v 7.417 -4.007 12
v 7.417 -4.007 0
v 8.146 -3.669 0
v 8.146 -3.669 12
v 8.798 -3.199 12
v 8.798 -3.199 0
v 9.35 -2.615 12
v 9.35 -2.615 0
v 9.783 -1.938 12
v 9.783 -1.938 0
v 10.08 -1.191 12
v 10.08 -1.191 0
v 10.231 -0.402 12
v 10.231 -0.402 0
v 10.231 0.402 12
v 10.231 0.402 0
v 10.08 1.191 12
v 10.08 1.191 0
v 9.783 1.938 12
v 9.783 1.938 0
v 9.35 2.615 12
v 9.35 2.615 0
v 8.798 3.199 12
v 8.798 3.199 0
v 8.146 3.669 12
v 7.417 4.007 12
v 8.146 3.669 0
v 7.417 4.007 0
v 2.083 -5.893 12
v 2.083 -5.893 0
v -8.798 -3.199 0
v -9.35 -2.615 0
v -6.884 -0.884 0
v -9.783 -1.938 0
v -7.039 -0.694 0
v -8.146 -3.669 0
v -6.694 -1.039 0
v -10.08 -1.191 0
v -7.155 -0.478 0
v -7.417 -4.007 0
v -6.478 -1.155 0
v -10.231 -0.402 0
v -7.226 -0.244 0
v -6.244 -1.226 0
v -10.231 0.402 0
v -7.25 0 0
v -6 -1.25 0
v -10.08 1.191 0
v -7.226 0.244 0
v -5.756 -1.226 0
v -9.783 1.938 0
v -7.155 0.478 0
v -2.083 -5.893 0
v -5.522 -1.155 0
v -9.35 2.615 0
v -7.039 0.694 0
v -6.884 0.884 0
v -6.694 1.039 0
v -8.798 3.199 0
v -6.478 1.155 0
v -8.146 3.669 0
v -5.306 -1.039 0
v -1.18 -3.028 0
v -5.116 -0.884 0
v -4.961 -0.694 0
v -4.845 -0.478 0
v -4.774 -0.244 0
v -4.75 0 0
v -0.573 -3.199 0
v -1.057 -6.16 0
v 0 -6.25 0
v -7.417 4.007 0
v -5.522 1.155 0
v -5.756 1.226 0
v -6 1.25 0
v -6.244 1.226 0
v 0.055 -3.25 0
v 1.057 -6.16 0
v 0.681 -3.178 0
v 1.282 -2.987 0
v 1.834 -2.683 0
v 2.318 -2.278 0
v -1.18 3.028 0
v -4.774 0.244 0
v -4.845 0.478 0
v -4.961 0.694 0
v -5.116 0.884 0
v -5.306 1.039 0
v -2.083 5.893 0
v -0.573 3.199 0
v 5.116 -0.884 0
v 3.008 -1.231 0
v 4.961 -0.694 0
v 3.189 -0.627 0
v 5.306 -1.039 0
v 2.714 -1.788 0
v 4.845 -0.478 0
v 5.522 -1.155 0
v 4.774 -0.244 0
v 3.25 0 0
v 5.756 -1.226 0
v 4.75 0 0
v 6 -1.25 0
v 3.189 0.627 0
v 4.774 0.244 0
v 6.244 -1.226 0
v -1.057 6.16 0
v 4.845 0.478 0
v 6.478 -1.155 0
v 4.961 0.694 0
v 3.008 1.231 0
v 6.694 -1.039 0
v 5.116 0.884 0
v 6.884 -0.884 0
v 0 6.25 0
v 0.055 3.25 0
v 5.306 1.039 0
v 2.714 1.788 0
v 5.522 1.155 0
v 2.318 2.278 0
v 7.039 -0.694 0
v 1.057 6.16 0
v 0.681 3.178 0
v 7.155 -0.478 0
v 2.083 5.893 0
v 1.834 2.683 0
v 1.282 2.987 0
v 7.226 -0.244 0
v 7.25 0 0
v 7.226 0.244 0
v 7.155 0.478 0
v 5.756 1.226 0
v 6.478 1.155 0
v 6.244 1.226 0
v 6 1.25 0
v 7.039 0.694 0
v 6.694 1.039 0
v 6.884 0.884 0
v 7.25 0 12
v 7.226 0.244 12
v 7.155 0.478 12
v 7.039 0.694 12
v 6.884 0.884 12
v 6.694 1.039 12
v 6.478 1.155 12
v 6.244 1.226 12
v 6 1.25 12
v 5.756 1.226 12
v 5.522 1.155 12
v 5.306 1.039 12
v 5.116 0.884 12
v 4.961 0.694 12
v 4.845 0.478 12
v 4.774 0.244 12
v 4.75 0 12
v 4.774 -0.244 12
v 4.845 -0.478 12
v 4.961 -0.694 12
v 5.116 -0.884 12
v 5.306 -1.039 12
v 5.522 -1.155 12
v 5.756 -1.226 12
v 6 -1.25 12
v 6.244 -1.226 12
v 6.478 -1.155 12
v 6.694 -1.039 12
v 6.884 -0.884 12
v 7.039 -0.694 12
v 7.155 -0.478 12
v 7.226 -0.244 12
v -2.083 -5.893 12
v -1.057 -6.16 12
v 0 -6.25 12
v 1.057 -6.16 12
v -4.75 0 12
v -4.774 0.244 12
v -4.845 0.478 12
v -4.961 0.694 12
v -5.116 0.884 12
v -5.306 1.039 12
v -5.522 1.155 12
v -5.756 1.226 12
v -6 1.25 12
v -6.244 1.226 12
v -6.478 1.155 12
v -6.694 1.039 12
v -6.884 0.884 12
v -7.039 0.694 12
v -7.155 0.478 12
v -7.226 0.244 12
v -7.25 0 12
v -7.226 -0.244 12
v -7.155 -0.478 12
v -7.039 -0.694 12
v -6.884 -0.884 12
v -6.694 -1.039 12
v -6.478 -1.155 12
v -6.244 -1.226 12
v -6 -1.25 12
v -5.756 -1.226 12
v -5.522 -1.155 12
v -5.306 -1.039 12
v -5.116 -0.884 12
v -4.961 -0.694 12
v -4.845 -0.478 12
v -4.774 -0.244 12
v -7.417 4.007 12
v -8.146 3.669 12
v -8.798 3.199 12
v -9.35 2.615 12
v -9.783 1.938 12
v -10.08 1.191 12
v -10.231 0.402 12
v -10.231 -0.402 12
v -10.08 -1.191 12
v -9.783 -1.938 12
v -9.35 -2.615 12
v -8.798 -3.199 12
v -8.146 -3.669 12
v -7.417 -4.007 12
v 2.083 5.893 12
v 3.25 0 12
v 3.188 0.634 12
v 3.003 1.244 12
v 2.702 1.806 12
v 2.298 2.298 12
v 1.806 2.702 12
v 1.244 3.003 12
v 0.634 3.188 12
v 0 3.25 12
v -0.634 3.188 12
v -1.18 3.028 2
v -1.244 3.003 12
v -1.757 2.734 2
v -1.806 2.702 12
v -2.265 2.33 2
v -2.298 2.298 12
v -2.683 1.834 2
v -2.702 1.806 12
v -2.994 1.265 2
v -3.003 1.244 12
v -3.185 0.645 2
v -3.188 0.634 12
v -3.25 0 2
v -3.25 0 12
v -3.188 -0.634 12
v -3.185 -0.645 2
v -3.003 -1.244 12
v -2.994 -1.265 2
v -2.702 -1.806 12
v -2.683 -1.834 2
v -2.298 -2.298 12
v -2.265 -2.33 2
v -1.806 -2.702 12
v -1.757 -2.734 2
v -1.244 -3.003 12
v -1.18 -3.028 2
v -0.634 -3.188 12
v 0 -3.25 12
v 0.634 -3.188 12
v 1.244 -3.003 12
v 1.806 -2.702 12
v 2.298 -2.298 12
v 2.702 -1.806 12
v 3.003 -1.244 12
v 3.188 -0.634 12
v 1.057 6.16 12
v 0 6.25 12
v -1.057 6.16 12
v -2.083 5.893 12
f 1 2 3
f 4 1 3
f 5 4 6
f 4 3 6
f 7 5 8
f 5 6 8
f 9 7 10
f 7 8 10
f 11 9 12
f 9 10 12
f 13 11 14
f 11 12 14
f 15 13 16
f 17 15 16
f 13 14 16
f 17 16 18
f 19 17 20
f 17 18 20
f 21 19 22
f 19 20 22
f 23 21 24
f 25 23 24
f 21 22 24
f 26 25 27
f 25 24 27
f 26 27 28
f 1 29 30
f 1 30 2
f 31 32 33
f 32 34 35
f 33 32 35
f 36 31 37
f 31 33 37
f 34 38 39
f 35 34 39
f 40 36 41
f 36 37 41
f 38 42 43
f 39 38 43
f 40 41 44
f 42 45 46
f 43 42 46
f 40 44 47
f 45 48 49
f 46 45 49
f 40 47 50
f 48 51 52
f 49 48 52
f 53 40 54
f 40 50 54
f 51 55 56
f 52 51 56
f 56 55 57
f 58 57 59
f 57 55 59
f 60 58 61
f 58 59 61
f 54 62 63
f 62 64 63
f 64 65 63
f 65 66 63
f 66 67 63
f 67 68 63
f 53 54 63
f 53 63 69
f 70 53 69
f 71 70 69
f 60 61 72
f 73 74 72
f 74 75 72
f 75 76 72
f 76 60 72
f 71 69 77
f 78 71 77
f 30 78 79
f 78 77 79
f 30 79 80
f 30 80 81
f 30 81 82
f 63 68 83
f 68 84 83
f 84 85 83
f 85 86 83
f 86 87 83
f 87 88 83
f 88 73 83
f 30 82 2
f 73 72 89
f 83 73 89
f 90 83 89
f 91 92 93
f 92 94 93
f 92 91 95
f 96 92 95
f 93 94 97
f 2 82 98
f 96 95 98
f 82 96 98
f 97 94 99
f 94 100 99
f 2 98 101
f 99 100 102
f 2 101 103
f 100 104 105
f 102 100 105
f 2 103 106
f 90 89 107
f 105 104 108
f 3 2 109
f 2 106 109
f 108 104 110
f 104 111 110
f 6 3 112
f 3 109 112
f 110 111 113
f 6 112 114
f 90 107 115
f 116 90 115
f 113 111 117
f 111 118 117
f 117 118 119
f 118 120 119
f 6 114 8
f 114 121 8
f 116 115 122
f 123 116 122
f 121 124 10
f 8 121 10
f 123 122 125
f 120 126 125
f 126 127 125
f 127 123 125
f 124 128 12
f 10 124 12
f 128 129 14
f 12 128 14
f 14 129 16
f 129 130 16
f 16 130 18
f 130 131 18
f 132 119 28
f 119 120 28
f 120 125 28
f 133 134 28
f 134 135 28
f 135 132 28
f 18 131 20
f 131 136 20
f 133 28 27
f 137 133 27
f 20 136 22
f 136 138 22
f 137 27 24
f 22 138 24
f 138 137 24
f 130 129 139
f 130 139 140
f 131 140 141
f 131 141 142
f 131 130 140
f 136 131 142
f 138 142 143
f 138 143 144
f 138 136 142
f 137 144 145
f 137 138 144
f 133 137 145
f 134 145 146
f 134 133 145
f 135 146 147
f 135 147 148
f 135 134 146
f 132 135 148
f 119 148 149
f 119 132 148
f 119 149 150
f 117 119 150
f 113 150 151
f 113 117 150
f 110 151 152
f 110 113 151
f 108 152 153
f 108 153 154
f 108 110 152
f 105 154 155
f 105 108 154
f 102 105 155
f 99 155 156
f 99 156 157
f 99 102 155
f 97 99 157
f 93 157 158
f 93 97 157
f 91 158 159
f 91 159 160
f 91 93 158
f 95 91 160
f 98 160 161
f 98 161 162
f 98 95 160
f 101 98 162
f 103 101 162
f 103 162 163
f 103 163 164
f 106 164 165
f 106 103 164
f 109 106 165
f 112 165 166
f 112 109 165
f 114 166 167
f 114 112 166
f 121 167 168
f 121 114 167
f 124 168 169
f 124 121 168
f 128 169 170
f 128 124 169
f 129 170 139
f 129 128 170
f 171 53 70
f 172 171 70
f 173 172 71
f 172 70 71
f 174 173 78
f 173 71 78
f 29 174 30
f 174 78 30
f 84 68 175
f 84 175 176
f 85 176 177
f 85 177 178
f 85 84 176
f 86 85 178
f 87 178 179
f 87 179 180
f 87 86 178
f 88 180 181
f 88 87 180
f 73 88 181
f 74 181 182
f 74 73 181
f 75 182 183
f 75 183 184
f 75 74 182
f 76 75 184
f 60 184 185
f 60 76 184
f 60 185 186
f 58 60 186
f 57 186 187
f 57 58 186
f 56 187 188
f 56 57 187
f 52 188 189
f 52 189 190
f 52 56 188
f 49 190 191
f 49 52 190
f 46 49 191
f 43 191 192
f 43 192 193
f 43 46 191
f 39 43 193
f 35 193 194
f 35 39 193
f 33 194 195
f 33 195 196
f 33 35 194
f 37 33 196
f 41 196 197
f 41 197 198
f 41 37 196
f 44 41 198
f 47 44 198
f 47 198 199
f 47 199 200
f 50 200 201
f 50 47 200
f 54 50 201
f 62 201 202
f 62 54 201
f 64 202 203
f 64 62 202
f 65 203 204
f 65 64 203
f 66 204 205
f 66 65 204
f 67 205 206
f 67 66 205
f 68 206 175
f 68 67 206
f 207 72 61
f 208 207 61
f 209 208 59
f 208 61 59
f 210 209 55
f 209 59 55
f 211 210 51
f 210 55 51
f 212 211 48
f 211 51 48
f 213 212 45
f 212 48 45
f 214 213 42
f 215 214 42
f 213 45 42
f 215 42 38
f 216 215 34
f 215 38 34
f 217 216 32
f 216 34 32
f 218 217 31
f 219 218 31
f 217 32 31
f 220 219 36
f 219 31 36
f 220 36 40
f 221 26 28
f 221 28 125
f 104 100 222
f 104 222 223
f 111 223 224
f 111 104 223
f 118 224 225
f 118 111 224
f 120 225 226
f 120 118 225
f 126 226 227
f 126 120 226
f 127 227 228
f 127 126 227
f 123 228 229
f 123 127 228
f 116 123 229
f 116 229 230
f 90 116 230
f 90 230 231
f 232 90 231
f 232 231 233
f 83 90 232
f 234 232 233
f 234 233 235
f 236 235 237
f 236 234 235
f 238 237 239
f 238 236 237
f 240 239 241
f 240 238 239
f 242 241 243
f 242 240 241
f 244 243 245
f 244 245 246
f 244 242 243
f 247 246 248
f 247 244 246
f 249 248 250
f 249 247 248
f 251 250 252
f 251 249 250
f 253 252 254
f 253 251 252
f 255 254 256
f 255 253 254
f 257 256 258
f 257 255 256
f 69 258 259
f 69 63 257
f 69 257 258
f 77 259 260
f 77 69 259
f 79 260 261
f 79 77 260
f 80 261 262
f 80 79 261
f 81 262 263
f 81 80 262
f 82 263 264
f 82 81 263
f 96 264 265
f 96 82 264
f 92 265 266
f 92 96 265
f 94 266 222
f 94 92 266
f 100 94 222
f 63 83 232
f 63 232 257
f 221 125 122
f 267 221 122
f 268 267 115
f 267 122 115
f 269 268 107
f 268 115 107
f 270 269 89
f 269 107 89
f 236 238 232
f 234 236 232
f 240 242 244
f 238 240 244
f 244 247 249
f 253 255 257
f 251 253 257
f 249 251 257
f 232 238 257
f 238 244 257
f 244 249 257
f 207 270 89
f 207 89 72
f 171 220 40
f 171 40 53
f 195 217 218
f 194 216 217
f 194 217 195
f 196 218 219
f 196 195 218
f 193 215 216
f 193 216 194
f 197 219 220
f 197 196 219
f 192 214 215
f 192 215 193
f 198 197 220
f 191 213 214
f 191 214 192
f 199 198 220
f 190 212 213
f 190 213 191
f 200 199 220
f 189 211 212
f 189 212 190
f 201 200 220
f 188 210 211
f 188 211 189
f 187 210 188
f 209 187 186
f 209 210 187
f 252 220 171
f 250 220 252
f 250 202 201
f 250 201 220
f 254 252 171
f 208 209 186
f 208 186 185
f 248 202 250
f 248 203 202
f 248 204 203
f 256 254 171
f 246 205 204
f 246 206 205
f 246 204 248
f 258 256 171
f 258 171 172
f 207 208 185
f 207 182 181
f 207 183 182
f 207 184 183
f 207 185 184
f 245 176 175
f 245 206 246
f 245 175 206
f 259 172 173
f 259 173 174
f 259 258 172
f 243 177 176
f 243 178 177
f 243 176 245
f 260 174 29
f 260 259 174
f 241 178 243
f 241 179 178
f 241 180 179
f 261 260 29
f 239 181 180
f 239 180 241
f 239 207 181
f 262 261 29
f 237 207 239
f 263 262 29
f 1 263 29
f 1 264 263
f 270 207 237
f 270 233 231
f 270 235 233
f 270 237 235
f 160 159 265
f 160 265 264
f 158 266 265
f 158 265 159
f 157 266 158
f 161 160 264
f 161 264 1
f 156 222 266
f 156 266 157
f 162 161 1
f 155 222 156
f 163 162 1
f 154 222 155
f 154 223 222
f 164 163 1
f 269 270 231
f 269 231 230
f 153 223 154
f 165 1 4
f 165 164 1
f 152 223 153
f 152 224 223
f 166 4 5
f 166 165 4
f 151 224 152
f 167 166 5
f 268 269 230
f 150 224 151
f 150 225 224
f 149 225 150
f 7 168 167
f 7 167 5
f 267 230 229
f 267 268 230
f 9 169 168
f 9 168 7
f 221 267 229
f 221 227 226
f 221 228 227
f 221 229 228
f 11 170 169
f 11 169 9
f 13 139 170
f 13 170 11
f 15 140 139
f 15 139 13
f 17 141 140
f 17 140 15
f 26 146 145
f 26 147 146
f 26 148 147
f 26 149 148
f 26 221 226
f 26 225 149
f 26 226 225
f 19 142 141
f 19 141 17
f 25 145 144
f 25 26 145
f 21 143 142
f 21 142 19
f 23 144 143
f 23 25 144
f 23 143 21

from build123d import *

# Parameters (mm, degrees)
F0_R     = 1.25
F0_R_2   = 3.25
F1_DEPTH = 12
F3_DEPTH = 2


with BuildPart() as f1:
    # F0 (on Top) → F1 (new body)
    with BuildSketch(Plane.XY):
        with BuildLine():
            ThreePointArc((7.416667, -4.006938), (10.25, 0), (7.416667, 4.006938))
            Line((7.416667, 4.006938), (2.083333, 5.892557))
            ThreePointArc((2.083333, 5.892557), (0, 6.25), (-2.083333, 5.892557))
            Line((-2.083333, 5.892557), (-7.416667, 4.006938))
            ThreePointArc((-7.416667, 4.006938), (-10.25, 0), (-7.416667, -4.006938))
            Line((-7.416667, -4.006938), (-2.083333, -5.892557))
            ThreePointArc((-2.083333, -5.892557), (0, -6.25), (2.083333, -5.892557))
            Line((2.083333, -5.892557), (7.416667, -4.006938))
        make_face()
        with Locations((-6, 0)):
            Circle(F0_R, mode=Mode.SUBTRACT)
        Circle(F0_R_2, mode=Mode.SUBTRACT)
        with Locations((6, 0)):
            Circle(F0_R, mode=Mode.SUBTRACT)
    extrude(amount=F1_DEPTH)

    # F2 (on face) → F3 (join)
    with BuildSketch(Plane(origin=(0, 0, 0), x_dir=(1, 0, 0), z_dir=(0, 0, -1))):
        with BuildLine():
            Line((-1.179652, -3.028353), (-1.179652, 3.028353))
            ThreePointArc((-1.179652, 3.028353), (-3.25, 0), (-1.179652, -3.028353))
        make_face()
    extrude(amount=-F3_DEPTH)


solid = f1.part
